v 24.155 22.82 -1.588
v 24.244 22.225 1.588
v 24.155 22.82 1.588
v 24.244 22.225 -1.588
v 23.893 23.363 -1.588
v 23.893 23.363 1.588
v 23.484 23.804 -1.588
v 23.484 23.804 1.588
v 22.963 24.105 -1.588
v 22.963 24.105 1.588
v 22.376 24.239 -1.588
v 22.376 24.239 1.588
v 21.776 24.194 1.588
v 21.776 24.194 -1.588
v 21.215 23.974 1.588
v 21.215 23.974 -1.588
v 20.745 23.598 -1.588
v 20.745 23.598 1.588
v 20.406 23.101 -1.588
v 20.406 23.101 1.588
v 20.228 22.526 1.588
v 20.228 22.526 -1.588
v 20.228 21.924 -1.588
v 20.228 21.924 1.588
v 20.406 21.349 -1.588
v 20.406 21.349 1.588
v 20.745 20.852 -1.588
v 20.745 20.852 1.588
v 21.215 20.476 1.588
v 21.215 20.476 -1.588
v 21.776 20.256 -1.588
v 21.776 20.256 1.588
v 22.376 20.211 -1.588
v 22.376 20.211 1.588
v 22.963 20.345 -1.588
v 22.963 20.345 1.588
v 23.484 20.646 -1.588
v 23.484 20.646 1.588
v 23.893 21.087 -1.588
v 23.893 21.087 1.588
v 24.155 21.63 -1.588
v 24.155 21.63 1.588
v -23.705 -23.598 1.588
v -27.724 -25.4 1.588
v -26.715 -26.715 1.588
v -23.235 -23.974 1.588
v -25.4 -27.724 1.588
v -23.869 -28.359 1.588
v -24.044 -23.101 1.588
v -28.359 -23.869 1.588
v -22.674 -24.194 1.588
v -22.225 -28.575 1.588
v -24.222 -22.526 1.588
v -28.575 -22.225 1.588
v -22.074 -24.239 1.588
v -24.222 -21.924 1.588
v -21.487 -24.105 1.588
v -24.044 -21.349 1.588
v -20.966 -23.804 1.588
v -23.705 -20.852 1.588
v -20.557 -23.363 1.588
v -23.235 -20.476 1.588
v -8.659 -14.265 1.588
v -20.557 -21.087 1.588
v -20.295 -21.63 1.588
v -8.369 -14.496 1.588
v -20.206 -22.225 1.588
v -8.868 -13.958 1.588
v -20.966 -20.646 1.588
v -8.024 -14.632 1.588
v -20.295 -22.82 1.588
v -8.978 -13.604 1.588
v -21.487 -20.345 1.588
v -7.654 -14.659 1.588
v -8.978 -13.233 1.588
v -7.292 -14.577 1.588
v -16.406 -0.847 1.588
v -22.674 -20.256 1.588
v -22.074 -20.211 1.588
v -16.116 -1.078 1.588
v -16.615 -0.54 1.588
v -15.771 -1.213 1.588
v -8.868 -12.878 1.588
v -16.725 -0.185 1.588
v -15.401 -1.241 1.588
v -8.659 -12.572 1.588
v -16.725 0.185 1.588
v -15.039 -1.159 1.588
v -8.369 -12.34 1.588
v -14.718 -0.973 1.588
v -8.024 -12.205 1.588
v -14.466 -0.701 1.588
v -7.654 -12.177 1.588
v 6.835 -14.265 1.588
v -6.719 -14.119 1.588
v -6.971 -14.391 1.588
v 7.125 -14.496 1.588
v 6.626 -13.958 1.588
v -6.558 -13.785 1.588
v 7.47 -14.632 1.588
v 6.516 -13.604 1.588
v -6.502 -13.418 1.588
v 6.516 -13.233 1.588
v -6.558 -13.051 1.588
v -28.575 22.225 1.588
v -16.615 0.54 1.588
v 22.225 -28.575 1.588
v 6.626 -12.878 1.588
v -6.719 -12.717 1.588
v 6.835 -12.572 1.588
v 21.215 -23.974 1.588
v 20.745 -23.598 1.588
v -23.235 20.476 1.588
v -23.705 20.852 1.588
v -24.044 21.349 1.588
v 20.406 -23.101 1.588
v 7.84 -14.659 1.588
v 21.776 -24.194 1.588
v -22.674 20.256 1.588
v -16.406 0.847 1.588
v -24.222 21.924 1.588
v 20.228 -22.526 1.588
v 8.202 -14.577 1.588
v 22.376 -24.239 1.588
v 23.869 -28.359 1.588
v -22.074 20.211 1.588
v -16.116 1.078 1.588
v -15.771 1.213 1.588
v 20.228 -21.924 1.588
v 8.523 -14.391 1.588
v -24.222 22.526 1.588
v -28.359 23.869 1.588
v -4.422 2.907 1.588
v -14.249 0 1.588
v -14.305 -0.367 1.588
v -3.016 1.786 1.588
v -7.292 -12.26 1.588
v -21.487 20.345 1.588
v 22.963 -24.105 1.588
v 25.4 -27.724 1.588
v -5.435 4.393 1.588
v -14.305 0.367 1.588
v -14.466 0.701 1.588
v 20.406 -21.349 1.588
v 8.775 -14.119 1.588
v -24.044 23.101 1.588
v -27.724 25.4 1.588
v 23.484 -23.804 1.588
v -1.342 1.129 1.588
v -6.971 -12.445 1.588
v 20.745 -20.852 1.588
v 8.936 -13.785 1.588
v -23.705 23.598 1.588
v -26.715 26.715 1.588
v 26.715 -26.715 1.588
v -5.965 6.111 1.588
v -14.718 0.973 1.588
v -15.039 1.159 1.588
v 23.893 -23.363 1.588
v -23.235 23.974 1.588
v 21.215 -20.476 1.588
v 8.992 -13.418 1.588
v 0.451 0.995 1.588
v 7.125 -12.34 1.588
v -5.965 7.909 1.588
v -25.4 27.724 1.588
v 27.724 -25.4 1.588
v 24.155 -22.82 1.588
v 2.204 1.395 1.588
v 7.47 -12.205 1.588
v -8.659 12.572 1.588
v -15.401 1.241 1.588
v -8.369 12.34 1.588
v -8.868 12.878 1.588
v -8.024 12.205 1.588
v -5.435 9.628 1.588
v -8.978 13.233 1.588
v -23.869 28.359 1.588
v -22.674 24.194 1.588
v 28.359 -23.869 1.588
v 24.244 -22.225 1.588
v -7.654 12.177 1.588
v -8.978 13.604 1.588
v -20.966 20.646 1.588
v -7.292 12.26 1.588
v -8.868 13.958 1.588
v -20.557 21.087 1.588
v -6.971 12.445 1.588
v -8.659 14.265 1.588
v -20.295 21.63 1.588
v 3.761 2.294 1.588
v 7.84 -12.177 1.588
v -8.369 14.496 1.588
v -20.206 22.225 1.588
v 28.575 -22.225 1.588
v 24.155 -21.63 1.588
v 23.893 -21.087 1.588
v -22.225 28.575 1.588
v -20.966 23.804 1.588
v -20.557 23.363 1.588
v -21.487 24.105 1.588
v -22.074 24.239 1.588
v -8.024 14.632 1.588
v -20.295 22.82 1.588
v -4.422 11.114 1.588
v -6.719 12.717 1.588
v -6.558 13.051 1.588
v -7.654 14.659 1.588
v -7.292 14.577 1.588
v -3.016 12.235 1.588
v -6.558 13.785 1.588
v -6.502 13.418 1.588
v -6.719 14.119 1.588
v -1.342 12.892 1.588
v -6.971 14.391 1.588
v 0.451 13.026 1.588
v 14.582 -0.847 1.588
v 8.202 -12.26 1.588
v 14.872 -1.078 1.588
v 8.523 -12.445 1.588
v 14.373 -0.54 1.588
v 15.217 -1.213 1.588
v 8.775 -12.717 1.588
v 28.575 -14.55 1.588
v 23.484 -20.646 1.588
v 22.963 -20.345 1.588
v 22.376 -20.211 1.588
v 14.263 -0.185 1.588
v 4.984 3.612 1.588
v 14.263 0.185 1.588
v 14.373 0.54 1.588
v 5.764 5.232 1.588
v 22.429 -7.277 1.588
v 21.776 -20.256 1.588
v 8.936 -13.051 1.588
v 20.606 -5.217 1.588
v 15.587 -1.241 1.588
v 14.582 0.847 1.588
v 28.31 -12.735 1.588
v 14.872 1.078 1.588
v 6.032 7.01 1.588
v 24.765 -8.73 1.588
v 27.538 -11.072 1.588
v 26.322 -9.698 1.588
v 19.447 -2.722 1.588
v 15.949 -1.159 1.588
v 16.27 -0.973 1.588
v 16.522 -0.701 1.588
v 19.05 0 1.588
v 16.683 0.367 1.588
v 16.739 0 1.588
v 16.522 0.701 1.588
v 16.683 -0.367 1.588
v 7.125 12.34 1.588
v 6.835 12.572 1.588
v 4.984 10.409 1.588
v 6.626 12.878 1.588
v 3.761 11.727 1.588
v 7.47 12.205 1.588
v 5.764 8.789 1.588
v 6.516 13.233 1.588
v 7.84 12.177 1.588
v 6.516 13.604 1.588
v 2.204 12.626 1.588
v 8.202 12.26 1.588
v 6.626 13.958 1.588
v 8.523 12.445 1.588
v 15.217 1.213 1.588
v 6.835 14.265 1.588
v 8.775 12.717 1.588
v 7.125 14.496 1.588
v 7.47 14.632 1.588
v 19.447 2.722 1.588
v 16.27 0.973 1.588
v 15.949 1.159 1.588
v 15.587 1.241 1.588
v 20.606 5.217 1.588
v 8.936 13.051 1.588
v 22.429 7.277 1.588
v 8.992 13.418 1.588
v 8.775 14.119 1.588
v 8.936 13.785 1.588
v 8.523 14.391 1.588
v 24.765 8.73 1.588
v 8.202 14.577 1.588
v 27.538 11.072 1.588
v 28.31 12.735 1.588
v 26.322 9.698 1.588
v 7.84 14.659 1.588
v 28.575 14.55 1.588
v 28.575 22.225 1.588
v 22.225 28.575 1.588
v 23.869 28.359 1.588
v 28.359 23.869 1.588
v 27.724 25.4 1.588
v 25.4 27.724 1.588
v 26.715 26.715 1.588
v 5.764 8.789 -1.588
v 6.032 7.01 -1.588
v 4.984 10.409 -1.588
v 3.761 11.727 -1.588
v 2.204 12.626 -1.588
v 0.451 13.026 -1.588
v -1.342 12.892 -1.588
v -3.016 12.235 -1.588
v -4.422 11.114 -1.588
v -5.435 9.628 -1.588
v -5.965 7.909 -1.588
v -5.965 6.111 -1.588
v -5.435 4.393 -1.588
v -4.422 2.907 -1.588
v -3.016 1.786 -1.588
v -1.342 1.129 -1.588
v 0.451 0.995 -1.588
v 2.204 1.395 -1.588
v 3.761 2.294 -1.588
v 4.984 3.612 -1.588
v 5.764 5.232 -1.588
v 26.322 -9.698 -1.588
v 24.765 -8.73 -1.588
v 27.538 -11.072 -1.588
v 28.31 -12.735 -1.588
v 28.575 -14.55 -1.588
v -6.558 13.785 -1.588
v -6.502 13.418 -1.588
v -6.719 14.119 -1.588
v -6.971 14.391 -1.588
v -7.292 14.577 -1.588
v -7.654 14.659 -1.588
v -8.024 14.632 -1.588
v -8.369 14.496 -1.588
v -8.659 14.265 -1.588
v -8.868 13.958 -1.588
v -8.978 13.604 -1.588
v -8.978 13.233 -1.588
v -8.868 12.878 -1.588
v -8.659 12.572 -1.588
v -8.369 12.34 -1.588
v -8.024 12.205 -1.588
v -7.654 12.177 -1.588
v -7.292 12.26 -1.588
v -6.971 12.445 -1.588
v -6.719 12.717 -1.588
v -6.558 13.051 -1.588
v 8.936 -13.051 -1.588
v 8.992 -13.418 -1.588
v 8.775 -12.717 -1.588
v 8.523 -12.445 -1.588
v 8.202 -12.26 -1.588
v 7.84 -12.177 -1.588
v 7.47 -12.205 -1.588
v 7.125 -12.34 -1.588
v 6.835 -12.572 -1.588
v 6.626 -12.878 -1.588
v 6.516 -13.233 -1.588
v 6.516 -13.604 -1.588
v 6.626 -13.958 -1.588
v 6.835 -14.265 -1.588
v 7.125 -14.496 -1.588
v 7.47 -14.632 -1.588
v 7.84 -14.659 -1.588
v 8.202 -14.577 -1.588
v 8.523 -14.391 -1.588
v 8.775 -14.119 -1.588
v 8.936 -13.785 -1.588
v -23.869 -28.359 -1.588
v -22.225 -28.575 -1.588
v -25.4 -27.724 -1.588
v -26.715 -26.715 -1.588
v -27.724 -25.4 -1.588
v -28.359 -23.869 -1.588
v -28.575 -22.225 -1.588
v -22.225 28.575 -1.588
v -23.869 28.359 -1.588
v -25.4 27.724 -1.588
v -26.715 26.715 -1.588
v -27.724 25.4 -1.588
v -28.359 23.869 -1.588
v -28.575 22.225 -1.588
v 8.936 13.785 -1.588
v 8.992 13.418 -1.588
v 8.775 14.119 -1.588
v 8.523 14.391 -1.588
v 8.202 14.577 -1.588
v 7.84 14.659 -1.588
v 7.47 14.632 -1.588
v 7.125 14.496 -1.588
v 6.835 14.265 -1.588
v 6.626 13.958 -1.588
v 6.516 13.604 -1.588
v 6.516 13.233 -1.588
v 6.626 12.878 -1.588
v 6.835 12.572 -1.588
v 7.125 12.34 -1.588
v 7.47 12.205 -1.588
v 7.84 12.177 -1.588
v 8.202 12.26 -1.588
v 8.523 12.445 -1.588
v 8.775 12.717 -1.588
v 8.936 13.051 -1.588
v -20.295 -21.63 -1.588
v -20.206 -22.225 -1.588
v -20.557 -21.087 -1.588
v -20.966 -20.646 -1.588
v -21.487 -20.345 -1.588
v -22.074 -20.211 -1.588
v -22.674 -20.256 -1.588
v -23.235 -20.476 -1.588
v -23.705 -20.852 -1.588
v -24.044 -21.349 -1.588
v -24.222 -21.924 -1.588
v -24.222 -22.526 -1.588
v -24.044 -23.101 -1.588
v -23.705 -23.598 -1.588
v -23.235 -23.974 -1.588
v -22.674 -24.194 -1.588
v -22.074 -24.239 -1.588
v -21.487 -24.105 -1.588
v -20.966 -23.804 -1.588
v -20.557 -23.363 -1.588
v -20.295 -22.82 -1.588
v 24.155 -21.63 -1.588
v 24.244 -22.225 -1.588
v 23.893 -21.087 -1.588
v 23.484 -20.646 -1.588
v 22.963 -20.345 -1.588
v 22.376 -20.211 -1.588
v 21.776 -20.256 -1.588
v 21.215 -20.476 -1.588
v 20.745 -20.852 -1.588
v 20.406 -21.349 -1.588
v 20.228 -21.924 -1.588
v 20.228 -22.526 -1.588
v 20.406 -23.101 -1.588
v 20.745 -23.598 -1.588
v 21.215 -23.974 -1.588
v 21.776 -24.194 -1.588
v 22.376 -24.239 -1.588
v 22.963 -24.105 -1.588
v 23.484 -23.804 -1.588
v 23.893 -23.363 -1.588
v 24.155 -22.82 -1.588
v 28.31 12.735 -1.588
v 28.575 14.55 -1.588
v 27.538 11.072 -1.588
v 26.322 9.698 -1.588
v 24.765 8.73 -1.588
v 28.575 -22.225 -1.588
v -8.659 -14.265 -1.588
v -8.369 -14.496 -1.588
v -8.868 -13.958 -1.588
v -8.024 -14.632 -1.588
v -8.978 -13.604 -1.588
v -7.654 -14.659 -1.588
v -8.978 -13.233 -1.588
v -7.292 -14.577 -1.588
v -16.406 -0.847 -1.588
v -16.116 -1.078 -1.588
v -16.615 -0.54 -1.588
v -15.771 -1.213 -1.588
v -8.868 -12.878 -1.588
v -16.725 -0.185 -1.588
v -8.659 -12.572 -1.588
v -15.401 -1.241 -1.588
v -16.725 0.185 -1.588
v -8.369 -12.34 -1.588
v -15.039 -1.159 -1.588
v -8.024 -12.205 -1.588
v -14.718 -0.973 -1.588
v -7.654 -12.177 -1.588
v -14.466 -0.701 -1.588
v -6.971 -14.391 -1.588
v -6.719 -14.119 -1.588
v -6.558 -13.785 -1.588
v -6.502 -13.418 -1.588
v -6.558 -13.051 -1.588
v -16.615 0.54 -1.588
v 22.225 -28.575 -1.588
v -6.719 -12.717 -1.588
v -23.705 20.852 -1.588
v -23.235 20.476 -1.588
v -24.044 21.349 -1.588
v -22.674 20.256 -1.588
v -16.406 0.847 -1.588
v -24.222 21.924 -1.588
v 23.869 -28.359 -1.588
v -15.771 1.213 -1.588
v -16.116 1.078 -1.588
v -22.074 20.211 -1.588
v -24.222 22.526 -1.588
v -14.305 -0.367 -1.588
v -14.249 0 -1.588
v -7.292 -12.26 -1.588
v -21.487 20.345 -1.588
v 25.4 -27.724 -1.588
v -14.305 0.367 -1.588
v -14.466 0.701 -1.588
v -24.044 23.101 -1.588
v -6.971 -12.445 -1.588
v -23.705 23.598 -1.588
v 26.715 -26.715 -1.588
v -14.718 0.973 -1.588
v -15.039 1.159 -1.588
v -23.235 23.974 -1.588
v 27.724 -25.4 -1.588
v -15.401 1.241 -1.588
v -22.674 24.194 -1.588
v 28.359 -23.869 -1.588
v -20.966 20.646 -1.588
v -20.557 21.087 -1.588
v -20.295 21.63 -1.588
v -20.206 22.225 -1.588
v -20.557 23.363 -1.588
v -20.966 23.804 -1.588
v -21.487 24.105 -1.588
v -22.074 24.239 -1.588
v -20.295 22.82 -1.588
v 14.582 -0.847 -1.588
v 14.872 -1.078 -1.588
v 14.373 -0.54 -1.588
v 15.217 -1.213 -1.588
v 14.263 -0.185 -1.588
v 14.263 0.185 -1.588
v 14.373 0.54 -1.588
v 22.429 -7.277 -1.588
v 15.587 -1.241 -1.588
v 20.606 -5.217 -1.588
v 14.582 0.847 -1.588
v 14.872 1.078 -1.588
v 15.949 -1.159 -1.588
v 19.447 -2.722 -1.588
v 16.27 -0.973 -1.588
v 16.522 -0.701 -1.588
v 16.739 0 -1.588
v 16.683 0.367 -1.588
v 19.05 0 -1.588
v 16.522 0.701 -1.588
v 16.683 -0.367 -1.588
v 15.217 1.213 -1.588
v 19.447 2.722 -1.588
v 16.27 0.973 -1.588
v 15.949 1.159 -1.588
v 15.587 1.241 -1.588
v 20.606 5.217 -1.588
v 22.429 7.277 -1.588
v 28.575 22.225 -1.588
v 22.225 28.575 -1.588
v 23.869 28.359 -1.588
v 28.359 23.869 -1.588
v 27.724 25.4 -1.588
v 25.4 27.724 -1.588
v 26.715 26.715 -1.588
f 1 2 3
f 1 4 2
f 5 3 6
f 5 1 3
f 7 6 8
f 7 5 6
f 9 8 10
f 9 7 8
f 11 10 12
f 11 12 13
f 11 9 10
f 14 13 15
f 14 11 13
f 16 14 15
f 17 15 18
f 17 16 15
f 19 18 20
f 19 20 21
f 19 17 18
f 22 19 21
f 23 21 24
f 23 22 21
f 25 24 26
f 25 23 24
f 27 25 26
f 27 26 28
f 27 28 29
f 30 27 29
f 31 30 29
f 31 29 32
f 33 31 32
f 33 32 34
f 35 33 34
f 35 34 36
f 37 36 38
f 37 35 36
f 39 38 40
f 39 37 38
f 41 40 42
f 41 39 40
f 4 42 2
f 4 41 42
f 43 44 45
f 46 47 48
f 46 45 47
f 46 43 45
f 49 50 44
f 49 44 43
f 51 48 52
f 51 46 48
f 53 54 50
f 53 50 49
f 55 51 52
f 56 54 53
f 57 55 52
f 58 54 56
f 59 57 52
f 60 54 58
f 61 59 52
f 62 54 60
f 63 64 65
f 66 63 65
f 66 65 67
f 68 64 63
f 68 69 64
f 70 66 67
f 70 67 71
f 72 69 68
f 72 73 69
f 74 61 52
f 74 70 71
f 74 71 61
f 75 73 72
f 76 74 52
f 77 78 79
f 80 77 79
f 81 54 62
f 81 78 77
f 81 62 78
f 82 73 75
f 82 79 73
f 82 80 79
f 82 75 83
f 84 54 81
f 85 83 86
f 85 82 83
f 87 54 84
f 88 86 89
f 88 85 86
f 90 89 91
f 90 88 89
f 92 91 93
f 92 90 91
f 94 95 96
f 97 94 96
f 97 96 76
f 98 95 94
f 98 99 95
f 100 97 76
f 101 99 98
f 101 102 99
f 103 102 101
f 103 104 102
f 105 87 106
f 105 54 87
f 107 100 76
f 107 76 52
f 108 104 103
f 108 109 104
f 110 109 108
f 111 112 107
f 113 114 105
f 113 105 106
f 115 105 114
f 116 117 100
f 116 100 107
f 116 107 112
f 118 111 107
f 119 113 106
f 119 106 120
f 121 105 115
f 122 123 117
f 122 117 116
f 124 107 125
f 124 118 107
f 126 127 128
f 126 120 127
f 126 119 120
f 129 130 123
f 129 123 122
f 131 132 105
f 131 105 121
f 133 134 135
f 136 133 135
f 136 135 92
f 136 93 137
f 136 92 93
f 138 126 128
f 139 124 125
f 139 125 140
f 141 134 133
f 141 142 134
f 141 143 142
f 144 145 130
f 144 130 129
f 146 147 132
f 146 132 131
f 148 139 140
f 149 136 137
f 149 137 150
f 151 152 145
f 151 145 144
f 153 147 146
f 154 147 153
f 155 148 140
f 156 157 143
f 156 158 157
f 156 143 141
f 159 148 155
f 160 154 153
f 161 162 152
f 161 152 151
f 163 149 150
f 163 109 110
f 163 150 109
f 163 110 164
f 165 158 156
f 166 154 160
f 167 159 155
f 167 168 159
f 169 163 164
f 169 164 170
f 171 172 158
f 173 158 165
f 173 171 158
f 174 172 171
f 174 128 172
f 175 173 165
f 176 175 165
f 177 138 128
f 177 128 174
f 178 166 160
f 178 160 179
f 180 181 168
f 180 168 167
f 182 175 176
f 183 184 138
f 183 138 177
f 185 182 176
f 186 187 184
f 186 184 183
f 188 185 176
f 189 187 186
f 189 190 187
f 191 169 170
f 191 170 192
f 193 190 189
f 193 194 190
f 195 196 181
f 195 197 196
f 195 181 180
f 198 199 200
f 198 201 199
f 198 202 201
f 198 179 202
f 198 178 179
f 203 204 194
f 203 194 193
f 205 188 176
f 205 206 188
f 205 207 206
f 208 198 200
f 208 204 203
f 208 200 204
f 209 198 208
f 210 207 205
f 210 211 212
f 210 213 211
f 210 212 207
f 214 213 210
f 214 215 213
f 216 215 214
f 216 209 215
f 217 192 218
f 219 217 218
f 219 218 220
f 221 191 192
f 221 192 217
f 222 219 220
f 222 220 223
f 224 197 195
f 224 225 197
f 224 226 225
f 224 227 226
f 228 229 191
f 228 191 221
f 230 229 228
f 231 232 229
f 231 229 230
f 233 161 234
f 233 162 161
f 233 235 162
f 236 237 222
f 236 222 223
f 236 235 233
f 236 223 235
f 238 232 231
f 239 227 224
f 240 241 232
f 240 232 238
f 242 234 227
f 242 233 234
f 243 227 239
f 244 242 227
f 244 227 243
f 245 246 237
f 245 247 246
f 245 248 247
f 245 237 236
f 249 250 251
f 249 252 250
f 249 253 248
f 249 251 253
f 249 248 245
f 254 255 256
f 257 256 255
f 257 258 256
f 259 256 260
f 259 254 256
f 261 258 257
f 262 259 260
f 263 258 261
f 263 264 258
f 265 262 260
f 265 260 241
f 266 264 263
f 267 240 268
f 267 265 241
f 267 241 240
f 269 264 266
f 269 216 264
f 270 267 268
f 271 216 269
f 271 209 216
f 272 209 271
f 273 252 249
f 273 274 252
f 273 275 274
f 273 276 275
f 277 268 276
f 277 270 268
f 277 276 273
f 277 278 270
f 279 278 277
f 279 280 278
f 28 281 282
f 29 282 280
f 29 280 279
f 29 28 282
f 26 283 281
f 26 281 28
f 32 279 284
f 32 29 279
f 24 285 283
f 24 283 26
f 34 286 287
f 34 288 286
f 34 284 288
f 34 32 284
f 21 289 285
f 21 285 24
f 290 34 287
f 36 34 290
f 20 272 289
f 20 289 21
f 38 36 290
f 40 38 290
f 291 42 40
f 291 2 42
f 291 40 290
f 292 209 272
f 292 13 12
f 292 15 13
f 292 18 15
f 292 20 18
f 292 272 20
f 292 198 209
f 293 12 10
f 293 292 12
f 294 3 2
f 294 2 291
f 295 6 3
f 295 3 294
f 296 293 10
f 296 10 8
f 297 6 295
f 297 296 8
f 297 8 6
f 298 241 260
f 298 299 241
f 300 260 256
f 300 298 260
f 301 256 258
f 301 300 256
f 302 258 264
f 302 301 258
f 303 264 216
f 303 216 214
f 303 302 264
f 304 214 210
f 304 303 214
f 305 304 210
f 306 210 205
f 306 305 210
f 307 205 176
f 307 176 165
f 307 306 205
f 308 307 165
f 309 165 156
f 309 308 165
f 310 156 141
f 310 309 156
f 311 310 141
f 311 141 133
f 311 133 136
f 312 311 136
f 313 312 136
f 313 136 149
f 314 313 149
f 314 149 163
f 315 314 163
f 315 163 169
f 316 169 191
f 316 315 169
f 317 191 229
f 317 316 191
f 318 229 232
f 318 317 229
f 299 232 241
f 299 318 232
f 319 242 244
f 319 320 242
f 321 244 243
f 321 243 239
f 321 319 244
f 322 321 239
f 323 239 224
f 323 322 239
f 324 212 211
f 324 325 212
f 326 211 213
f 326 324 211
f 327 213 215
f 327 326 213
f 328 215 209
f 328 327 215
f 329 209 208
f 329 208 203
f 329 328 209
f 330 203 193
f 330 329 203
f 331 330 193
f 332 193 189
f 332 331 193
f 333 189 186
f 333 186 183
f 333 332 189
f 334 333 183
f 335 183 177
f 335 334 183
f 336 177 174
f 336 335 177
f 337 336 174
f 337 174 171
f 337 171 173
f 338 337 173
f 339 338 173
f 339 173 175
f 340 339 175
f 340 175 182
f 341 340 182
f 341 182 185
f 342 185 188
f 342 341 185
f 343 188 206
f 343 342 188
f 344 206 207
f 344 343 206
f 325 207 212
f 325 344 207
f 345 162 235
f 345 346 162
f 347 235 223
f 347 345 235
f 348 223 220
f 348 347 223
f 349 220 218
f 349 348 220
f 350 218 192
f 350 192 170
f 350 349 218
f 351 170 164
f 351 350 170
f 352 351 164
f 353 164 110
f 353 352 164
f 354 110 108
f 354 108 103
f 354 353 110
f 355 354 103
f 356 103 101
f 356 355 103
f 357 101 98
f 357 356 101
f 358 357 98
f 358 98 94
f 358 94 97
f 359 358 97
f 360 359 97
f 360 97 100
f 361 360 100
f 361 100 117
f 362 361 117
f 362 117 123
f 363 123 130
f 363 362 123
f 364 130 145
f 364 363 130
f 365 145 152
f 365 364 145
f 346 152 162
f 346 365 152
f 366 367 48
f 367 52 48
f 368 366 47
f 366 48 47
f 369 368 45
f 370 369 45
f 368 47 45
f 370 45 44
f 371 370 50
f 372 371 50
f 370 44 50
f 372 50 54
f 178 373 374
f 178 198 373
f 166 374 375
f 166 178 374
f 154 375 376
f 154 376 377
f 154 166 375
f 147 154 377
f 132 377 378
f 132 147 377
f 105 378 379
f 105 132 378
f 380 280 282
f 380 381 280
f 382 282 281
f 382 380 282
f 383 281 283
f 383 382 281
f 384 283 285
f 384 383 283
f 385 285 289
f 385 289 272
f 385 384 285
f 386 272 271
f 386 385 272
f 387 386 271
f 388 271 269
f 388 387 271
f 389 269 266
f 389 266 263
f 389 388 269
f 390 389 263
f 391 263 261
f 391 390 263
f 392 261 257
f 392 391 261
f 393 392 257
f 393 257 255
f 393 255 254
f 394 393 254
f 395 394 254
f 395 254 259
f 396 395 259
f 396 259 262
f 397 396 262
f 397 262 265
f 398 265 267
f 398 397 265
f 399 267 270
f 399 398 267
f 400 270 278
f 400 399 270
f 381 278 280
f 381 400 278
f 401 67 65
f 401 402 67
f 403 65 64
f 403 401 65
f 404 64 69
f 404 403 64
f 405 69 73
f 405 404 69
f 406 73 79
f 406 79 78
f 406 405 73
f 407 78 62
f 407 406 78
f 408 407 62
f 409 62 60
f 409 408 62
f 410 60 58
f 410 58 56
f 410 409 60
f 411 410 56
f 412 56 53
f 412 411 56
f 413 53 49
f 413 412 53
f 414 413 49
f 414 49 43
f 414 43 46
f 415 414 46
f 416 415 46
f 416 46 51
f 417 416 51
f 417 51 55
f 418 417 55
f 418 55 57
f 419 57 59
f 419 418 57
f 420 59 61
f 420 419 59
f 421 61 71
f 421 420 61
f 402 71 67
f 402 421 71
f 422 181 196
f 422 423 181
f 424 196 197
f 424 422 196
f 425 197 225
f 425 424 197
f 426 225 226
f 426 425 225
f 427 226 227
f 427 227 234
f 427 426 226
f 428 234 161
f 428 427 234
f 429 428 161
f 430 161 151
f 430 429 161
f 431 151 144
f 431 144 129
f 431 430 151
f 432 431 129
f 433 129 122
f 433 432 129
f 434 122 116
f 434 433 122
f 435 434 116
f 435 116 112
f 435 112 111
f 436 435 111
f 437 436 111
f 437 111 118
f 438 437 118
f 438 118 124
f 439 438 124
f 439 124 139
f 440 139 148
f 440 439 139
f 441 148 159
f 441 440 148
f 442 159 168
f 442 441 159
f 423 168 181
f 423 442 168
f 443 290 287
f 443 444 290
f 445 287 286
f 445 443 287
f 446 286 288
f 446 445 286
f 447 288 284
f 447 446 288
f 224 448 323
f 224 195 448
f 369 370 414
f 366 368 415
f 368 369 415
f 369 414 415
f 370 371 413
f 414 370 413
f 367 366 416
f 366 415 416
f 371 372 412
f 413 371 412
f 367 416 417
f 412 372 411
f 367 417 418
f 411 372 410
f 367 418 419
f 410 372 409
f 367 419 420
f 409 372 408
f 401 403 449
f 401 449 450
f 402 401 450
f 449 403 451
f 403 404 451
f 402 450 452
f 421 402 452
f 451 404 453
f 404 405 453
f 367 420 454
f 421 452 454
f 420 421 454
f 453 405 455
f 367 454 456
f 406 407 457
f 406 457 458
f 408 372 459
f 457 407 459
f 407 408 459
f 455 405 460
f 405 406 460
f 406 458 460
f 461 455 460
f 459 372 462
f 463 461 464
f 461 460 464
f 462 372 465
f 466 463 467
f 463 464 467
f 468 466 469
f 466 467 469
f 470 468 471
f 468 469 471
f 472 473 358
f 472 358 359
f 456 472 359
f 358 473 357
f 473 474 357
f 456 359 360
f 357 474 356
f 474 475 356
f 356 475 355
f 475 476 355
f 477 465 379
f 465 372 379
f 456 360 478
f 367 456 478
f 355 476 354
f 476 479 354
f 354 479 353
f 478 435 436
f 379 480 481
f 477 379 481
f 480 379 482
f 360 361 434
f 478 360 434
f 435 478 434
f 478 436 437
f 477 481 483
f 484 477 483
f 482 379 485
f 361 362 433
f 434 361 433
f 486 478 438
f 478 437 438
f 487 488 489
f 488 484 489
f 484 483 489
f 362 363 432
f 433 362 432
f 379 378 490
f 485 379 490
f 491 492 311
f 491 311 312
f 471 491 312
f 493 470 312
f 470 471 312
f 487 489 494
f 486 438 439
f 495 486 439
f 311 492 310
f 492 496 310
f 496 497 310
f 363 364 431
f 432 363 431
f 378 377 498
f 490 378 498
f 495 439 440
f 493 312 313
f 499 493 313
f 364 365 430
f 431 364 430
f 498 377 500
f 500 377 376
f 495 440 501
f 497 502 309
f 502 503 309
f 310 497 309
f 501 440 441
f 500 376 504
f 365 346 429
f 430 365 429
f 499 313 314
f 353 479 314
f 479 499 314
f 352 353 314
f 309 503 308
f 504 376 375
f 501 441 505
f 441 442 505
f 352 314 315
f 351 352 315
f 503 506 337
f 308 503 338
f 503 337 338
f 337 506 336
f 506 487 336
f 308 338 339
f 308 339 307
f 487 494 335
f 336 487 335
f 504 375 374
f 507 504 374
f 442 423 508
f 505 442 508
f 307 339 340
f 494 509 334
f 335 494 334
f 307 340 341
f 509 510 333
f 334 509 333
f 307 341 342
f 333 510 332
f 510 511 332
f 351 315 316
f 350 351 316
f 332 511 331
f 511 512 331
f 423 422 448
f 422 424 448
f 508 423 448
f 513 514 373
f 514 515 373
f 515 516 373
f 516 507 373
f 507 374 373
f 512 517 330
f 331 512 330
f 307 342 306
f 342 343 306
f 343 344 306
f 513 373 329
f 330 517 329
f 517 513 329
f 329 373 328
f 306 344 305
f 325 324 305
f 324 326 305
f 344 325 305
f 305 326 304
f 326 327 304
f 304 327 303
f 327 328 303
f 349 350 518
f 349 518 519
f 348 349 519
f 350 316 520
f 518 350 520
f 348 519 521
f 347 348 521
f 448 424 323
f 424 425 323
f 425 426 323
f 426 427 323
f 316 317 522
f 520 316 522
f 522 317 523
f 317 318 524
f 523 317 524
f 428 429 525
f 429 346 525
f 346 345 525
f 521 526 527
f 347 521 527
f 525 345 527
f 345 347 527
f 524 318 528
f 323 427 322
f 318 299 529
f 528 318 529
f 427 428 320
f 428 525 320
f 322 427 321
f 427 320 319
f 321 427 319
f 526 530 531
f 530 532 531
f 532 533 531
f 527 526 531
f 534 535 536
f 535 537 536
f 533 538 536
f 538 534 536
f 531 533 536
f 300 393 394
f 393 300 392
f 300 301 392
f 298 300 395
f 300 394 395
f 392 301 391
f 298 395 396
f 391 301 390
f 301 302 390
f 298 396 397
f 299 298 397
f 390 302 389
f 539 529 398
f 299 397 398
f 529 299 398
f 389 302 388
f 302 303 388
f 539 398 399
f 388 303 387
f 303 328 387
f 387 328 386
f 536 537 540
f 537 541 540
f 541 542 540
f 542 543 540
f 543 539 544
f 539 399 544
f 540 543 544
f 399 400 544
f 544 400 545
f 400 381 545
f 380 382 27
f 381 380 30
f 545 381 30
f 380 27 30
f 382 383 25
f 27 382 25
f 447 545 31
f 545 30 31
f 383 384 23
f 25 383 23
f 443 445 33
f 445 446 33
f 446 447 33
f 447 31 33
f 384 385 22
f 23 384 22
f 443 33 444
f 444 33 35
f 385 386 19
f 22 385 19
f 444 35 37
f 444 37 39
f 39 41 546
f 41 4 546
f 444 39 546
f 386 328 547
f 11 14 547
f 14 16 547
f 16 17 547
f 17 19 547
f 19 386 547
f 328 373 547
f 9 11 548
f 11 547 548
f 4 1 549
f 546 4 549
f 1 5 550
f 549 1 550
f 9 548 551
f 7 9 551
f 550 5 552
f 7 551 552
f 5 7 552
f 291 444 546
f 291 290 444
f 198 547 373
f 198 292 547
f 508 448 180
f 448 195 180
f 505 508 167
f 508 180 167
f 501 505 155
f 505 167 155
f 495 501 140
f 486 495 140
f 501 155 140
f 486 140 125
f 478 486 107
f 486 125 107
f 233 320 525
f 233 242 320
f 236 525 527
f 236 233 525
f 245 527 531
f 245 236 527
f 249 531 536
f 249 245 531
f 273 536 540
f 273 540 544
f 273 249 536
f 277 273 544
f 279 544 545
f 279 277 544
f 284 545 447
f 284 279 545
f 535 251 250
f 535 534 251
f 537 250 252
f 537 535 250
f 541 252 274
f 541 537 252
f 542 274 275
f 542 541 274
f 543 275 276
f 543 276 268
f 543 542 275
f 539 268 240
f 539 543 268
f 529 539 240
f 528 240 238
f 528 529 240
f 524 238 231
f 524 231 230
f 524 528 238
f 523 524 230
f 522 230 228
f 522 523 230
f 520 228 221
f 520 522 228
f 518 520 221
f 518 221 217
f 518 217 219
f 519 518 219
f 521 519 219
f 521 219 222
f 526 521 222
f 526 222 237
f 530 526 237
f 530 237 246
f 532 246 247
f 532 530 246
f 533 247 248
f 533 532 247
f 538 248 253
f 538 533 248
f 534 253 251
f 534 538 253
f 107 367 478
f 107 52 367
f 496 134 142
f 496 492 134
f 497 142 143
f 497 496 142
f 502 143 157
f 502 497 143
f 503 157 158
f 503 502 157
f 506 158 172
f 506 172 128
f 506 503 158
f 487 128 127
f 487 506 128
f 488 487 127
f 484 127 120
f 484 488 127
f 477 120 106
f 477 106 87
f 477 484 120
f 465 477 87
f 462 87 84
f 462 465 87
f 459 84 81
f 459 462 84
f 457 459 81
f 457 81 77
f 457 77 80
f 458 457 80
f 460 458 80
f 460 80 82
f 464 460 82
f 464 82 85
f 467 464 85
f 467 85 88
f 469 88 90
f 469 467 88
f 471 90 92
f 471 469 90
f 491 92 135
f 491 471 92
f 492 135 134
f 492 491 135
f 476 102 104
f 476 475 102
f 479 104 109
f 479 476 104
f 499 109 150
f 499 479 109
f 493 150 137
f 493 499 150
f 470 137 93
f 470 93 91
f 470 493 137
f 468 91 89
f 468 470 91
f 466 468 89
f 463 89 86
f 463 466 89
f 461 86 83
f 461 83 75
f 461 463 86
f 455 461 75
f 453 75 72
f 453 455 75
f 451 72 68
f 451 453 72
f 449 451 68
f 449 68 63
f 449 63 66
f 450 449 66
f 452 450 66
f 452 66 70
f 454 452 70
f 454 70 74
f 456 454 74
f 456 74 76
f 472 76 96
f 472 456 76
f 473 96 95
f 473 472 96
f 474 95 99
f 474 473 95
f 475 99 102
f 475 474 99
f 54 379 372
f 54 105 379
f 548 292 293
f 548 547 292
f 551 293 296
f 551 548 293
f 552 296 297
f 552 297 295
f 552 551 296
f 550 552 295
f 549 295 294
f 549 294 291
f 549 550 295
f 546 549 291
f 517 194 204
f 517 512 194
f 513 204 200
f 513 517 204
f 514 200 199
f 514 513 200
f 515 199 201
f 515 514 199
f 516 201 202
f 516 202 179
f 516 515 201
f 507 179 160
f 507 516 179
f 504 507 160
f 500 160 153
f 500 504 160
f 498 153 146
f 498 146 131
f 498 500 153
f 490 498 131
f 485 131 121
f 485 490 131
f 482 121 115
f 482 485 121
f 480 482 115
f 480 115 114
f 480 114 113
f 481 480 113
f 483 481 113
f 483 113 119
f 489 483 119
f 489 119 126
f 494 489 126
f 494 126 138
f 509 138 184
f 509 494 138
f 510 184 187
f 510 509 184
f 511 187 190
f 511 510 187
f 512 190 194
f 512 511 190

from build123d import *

# Parameters (mm, degrees)
SKETCH1_R           = 2.0193
SKETCH1_R_2         = 1.2446
SKETCH1_R_3         = 6.0325
BOSS_EXTRUDE1_DEPTH = 1.5875
FILLET2_R           = 6.35


with BuildPart() as part:
    # Sketch1 → Boss-Extrude1 (new, symmetric)
    with BuildSketch(Plane.XY):
        with BuildLine():
            Line((28.575, 28.575), (-28.575, 28.575))
            Line((-28.575, 28.575), (-28.575, -28.575))
            Line((-28.575, -28.575), (28.575, -28.575))
            Line((28.575, -28.575), (28.575, -9.525))
            ThreePointArc((28.575, -9.525), (19.05, 0), (28.575, 9.525))
            Line((28.575, 9.525), (28.575, 28.575))
        make_face()
        with Locations((-22.225, -22.225)):
            Circle(SKETCH1_R, mode=Mode.SUBTRACT)
        with Locations((-7.747, -13.418197606)):
            Circle(SKETCH1_R_2, mode=Mode.SUBTRACT)
        with Locations((22.225, -22.225)):
            Circle(SKETCH1_R, mode=Mode.SUBTRACT)
        with Locations((7.747, -13.418197606)):
            Circle(SKETCH1_R_2, mode=Mode.SUBTRACT)
        with Locations((15.494, 0)):
            Circle(SKETCH1_R_2, mode=Mode.SUBTRACT)
        with Locations((-15.494, 0)):
            Circle(SKETCH1_R_2, mode=Mode.SUBTRACT)
        with Locations((-7.747, 13.418197606)):
            Circle(SKETCH1_R_2, mode=Mode.SUBTRACT)
        with Locations((-22.225, 22.225)):
            Circle(SKETCH1_R, mode=Mode.SUBTRACT)
        with Locations((0, 7.0104)):
            Circle(SKETCH1_R_3, mode=Mode.SUBTRACT)
        with Locations((7.747, 13.418197606)):
            Circle(SKETCH1_R_2, mode=Mode.SUBTRACT)
        with Locations((22.225, 22.225)):
            Circle(SKETCH1_R, mode=Mode.SUBTRACT)
    extrude(amount=BOSS_EXTRUDE1_DEPTH, both=True)

    # Fillet2
    fillet2_edges = [part.edges().sort_by_distance(p)[0] for p in [
        (28.575, -9.525, 0),
        (28.575, -28.575, 0),
        (-28.575, -28.575, 0),
        (-28.575, 28.575, 0),
        (28.575, 28.575, 0),
        (28.575, 9.525, 0),
    ]]
    fillet(fillet2_edges, radius=FILLET2_R)


solid = part.part
